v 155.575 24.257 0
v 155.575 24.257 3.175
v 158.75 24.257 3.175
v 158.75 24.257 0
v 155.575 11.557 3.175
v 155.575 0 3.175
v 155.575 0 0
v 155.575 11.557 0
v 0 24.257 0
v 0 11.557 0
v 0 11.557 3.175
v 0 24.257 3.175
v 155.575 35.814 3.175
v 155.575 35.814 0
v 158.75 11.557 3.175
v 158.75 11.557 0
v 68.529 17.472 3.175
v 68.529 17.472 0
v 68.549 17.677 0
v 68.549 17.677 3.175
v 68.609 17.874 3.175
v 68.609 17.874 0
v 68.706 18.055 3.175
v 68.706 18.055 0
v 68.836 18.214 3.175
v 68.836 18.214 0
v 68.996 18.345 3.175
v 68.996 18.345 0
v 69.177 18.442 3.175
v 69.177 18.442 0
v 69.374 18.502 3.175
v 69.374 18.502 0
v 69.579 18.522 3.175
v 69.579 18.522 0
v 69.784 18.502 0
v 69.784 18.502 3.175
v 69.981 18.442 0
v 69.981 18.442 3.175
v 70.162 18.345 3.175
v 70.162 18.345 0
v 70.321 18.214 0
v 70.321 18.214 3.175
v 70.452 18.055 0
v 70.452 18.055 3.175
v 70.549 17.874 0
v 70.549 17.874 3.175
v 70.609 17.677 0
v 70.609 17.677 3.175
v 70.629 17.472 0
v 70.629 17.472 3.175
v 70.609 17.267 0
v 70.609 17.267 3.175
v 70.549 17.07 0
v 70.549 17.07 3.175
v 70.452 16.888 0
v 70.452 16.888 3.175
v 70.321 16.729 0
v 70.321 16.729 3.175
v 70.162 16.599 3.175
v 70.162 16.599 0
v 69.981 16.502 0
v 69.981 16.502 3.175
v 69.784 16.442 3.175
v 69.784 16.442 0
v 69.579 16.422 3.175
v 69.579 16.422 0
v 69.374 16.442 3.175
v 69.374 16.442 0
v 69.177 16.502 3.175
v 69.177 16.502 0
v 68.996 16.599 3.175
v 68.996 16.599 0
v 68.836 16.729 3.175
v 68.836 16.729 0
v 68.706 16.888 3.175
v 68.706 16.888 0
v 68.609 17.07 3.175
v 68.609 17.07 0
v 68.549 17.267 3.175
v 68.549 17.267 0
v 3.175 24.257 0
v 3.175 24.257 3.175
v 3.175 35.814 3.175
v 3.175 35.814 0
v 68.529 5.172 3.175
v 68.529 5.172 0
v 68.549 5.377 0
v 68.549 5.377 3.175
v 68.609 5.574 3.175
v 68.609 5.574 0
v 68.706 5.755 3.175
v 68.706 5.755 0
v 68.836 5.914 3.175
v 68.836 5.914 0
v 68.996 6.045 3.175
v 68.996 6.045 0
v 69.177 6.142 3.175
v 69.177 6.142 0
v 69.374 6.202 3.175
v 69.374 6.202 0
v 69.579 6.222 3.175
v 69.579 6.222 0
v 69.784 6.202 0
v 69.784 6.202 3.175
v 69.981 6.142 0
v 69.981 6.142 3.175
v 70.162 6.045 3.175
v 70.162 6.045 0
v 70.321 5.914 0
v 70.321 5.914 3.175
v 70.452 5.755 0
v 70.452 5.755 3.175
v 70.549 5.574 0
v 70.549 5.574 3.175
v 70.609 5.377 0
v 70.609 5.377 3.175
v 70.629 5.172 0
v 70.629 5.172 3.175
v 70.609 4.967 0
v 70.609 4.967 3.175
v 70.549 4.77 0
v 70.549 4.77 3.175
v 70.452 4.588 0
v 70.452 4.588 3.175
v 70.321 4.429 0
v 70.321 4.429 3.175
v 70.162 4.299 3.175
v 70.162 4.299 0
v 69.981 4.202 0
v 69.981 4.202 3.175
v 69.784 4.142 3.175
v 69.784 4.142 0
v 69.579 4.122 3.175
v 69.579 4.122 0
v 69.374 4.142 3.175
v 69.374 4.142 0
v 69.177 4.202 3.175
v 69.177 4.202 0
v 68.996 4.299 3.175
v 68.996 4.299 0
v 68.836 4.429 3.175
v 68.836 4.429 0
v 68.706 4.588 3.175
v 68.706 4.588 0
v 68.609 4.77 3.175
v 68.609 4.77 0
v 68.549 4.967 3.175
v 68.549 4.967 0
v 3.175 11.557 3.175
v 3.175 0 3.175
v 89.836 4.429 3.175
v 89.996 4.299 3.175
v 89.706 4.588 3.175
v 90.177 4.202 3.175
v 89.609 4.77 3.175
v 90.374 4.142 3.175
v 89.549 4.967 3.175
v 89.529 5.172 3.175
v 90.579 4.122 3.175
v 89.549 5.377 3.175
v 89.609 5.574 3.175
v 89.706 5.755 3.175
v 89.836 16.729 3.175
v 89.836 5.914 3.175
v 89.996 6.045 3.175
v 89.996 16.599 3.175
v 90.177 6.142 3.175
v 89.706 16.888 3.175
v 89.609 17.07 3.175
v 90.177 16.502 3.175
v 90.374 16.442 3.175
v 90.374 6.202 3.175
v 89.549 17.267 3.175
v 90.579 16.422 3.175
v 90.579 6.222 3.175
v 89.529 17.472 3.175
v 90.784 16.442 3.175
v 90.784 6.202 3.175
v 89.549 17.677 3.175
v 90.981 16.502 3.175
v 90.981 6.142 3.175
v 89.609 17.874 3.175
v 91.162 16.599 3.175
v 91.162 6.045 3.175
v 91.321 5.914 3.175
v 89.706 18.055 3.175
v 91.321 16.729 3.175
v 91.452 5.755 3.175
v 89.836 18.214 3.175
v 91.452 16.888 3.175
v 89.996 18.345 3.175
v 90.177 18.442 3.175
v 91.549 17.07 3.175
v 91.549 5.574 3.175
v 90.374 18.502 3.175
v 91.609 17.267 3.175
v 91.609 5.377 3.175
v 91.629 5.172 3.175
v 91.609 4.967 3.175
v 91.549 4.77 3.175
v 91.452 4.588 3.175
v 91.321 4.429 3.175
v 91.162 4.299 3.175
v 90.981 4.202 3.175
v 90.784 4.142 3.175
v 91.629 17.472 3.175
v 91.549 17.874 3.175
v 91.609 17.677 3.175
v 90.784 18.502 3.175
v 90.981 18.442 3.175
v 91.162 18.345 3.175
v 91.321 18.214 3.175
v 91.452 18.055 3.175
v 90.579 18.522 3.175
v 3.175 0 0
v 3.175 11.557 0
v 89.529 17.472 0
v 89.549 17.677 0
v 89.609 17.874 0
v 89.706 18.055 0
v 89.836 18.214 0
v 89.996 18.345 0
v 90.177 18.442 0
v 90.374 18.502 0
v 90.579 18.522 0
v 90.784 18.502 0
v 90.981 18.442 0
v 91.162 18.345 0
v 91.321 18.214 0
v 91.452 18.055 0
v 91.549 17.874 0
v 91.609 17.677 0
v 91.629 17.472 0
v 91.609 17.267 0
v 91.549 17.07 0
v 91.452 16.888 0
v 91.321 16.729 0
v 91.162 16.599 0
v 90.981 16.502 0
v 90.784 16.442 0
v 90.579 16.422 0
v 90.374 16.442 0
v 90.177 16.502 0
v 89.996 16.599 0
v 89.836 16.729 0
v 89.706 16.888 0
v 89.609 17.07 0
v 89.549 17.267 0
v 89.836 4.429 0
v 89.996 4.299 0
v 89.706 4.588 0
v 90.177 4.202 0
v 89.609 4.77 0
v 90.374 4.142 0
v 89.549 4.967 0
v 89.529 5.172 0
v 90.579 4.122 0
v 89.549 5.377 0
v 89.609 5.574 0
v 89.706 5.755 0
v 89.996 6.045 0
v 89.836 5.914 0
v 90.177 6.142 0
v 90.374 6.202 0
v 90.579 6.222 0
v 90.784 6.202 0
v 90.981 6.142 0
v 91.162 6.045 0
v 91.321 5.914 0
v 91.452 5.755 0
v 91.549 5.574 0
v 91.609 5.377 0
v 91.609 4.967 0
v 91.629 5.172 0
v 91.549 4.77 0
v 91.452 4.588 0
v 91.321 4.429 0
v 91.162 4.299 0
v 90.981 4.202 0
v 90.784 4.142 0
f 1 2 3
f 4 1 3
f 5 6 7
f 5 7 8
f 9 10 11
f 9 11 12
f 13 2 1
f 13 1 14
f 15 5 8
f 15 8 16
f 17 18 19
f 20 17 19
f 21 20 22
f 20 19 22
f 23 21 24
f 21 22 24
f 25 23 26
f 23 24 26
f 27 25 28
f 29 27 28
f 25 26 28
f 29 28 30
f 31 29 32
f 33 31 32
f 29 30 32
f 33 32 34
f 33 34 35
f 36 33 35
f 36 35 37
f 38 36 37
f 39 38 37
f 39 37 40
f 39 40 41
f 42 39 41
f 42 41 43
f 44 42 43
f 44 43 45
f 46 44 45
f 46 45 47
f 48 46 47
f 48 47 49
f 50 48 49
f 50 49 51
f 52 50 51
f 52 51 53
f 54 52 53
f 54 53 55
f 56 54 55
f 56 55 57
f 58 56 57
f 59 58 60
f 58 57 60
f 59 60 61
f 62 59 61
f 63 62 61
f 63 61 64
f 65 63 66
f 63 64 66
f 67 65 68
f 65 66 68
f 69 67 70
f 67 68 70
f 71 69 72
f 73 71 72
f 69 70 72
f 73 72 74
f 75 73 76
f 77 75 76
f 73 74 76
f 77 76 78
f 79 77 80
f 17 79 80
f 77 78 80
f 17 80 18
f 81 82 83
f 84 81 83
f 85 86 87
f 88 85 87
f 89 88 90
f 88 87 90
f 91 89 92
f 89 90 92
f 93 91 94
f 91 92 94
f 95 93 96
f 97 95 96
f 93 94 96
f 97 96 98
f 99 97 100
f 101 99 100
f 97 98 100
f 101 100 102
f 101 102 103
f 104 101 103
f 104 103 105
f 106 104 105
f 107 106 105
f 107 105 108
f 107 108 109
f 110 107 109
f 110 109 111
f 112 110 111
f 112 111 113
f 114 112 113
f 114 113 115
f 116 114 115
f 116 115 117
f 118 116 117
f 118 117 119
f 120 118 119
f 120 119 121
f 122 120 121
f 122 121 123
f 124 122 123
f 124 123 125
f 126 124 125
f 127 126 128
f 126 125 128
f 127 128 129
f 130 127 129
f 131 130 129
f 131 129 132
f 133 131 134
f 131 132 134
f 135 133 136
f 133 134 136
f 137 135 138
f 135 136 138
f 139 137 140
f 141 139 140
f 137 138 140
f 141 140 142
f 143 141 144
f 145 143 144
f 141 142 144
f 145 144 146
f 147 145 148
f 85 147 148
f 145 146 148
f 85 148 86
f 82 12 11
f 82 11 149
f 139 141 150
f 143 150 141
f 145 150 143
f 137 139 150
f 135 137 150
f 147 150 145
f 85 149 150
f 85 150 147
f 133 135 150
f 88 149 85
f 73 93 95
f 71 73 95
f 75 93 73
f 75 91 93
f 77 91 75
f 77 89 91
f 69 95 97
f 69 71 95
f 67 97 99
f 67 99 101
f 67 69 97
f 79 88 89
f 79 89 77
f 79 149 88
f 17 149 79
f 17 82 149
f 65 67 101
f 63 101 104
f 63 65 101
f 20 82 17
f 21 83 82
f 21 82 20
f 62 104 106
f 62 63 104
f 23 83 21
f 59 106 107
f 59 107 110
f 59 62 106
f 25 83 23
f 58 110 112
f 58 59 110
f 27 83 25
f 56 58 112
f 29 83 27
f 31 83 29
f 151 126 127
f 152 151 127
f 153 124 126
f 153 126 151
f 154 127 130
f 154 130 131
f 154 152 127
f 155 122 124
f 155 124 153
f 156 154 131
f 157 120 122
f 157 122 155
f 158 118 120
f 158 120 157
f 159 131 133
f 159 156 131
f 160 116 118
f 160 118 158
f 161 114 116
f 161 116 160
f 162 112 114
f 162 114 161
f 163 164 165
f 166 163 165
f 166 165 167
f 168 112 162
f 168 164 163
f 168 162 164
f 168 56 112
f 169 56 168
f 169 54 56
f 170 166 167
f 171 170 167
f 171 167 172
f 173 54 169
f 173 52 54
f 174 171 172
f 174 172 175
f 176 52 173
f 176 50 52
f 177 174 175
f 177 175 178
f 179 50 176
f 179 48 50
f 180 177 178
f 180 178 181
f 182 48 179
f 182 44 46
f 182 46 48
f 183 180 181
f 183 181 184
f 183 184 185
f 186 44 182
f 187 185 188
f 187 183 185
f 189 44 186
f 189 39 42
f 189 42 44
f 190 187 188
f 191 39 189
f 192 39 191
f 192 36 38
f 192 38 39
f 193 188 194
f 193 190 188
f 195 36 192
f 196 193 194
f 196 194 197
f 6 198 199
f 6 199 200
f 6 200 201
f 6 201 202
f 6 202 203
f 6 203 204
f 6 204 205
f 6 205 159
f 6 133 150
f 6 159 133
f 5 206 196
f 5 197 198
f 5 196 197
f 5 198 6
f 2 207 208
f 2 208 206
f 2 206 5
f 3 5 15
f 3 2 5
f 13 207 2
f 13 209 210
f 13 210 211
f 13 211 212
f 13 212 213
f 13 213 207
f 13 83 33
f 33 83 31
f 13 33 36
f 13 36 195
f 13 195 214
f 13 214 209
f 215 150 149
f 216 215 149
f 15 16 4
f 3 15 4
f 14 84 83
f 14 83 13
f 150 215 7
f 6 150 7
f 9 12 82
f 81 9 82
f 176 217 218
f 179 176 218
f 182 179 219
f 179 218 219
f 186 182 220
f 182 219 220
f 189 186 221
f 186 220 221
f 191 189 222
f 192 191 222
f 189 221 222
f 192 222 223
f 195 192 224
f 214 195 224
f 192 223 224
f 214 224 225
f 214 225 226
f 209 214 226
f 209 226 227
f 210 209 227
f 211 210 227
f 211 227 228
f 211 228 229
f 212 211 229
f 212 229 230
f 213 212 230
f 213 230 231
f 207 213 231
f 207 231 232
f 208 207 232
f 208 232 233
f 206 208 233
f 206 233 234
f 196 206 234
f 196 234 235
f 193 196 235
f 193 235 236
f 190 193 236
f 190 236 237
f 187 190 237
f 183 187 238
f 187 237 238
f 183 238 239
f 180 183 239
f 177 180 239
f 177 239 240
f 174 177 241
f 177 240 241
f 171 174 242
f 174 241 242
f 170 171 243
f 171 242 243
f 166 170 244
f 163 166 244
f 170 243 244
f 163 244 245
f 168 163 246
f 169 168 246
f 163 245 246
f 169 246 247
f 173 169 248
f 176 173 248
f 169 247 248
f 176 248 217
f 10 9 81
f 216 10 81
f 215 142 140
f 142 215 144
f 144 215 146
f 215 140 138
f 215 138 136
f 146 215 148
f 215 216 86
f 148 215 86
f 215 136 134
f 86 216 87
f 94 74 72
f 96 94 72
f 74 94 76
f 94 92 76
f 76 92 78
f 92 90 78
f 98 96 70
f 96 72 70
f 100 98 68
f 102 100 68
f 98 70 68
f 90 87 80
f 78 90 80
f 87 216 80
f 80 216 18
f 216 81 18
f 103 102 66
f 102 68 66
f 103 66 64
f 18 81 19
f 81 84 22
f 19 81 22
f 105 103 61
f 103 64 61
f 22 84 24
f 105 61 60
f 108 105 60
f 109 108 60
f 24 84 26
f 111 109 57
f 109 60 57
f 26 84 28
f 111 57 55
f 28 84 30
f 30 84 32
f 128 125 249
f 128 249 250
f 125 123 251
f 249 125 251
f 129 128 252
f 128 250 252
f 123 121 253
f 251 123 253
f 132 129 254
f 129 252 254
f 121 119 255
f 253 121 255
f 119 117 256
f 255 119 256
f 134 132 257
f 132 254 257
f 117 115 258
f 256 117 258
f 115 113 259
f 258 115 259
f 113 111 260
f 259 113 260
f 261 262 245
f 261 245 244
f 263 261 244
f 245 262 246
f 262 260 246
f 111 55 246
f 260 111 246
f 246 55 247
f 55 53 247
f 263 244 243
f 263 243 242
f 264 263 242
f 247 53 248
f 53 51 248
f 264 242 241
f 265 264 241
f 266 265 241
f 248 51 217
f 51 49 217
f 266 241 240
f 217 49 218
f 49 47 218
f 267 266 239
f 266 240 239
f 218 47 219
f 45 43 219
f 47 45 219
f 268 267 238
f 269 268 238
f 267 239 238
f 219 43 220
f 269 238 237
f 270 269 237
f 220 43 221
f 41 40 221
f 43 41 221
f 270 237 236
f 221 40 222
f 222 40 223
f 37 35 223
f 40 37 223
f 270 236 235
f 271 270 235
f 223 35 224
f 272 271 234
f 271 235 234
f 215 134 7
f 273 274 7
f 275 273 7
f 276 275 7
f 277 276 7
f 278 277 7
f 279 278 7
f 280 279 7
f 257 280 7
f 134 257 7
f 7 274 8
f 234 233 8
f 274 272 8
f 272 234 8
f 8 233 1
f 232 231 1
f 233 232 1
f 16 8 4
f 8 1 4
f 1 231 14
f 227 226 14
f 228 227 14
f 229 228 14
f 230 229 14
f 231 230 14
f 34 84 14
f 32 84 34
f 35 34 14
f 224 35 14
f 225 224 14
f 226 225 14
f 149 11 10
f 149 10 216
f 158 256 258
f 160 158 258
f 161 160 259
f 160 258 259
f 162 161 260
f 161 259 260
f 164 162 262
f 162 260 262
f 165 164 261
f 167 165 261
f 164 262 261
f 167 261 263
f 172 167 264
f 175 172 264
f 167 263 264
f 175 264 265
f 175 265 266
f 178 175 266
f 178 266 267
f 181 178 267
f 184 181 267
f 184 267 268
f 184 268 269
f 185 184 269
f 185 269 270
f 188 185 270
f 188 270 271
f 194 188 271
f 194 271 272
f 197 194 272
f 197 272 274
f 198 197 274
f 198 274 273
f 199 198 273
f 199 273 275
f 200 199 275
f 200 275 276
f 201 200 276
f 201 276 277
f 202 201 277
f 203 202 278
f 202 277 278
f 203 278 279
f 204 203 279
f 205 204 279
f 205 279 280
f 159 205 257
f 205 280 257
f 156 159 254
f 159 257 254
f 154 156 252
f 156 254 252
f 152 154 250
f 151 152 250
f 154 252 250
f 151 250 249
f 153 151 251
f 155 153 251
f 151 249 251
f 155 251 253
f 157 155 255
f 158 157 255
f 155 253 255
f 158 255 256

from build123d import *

# Parameters (mm, degrees)
SKETCH1_W           = 158.75
SKETCH1_H           = 35.814
BOSS_EXTRUDE1_DEPTH = 3.175
SKETCH2_W           = 3.175
SKETCH2_H           = 11.557
CUT_EXTRUDE1_DEPTH  = 4.175
SKETCH3_R           = 1.05
CUT_EXTRUDE2_DEPTH  = 4.175


with BuildPart() as part:
    # Sketch1 → Boss-Extrude1 (new body)
    with BuildSketch(Plane.XY):
        with Locations((79.375, 17.907)):
            Rectangle(SKETCH1_W, SKETCH1_H)
    extrude(amount=BOSS_EXTRUDE1_DEPTH)

    # Sketch2 → Cut-Extrude1 (cut, through all)
    with BuildSketch(Plane.XY.offset(3.175)):
        with Locations((157.1625, 5.7785)):
            Rectangle(SKETCH2_W, SKETCH2_H)
        with Locations((1.5875, 5.7785)):
            Rectangle(SKETCH2_W, SKETCH2_H)
        with Locations((1.5875, 30.0355)):
            Rectangle(SKETCH2_W, SKETCH2_H)
        with Locations((157.1625, 30.0355)):
            Rectangle(SKETCH2_W, SKETCH2_H)
    extrude(amount=-CUT_EXTRUDE1_DEPTH, mode=Mode.SUBTRACT)

    # Sketch3 → Cut-Extrude2 (cut, through all)
    with BuildSketch(Plane(origin=(0, 0, 0), x_dir=(-1, 0, 0), z_dir=(0, 0, -1))):
        with Locations((-90.578925545, 17.471786094)):
            Circle(SKETCH3_R)
        with Locations((-69.578925545, 5.171786094)):
            Circle(SKETCH3_R)
        with Locations((-90.578925545, 5.171786094)):
            Circle(SKETCH3_R)
        with Locations((-69.578925545, 17.471786094)):
            Circle(SKETCH3_R)
    extrude(amount=-CUT_EXTRUDE2_DEPTH, mode=Mode.SUBTRACT)


solid = part.part
